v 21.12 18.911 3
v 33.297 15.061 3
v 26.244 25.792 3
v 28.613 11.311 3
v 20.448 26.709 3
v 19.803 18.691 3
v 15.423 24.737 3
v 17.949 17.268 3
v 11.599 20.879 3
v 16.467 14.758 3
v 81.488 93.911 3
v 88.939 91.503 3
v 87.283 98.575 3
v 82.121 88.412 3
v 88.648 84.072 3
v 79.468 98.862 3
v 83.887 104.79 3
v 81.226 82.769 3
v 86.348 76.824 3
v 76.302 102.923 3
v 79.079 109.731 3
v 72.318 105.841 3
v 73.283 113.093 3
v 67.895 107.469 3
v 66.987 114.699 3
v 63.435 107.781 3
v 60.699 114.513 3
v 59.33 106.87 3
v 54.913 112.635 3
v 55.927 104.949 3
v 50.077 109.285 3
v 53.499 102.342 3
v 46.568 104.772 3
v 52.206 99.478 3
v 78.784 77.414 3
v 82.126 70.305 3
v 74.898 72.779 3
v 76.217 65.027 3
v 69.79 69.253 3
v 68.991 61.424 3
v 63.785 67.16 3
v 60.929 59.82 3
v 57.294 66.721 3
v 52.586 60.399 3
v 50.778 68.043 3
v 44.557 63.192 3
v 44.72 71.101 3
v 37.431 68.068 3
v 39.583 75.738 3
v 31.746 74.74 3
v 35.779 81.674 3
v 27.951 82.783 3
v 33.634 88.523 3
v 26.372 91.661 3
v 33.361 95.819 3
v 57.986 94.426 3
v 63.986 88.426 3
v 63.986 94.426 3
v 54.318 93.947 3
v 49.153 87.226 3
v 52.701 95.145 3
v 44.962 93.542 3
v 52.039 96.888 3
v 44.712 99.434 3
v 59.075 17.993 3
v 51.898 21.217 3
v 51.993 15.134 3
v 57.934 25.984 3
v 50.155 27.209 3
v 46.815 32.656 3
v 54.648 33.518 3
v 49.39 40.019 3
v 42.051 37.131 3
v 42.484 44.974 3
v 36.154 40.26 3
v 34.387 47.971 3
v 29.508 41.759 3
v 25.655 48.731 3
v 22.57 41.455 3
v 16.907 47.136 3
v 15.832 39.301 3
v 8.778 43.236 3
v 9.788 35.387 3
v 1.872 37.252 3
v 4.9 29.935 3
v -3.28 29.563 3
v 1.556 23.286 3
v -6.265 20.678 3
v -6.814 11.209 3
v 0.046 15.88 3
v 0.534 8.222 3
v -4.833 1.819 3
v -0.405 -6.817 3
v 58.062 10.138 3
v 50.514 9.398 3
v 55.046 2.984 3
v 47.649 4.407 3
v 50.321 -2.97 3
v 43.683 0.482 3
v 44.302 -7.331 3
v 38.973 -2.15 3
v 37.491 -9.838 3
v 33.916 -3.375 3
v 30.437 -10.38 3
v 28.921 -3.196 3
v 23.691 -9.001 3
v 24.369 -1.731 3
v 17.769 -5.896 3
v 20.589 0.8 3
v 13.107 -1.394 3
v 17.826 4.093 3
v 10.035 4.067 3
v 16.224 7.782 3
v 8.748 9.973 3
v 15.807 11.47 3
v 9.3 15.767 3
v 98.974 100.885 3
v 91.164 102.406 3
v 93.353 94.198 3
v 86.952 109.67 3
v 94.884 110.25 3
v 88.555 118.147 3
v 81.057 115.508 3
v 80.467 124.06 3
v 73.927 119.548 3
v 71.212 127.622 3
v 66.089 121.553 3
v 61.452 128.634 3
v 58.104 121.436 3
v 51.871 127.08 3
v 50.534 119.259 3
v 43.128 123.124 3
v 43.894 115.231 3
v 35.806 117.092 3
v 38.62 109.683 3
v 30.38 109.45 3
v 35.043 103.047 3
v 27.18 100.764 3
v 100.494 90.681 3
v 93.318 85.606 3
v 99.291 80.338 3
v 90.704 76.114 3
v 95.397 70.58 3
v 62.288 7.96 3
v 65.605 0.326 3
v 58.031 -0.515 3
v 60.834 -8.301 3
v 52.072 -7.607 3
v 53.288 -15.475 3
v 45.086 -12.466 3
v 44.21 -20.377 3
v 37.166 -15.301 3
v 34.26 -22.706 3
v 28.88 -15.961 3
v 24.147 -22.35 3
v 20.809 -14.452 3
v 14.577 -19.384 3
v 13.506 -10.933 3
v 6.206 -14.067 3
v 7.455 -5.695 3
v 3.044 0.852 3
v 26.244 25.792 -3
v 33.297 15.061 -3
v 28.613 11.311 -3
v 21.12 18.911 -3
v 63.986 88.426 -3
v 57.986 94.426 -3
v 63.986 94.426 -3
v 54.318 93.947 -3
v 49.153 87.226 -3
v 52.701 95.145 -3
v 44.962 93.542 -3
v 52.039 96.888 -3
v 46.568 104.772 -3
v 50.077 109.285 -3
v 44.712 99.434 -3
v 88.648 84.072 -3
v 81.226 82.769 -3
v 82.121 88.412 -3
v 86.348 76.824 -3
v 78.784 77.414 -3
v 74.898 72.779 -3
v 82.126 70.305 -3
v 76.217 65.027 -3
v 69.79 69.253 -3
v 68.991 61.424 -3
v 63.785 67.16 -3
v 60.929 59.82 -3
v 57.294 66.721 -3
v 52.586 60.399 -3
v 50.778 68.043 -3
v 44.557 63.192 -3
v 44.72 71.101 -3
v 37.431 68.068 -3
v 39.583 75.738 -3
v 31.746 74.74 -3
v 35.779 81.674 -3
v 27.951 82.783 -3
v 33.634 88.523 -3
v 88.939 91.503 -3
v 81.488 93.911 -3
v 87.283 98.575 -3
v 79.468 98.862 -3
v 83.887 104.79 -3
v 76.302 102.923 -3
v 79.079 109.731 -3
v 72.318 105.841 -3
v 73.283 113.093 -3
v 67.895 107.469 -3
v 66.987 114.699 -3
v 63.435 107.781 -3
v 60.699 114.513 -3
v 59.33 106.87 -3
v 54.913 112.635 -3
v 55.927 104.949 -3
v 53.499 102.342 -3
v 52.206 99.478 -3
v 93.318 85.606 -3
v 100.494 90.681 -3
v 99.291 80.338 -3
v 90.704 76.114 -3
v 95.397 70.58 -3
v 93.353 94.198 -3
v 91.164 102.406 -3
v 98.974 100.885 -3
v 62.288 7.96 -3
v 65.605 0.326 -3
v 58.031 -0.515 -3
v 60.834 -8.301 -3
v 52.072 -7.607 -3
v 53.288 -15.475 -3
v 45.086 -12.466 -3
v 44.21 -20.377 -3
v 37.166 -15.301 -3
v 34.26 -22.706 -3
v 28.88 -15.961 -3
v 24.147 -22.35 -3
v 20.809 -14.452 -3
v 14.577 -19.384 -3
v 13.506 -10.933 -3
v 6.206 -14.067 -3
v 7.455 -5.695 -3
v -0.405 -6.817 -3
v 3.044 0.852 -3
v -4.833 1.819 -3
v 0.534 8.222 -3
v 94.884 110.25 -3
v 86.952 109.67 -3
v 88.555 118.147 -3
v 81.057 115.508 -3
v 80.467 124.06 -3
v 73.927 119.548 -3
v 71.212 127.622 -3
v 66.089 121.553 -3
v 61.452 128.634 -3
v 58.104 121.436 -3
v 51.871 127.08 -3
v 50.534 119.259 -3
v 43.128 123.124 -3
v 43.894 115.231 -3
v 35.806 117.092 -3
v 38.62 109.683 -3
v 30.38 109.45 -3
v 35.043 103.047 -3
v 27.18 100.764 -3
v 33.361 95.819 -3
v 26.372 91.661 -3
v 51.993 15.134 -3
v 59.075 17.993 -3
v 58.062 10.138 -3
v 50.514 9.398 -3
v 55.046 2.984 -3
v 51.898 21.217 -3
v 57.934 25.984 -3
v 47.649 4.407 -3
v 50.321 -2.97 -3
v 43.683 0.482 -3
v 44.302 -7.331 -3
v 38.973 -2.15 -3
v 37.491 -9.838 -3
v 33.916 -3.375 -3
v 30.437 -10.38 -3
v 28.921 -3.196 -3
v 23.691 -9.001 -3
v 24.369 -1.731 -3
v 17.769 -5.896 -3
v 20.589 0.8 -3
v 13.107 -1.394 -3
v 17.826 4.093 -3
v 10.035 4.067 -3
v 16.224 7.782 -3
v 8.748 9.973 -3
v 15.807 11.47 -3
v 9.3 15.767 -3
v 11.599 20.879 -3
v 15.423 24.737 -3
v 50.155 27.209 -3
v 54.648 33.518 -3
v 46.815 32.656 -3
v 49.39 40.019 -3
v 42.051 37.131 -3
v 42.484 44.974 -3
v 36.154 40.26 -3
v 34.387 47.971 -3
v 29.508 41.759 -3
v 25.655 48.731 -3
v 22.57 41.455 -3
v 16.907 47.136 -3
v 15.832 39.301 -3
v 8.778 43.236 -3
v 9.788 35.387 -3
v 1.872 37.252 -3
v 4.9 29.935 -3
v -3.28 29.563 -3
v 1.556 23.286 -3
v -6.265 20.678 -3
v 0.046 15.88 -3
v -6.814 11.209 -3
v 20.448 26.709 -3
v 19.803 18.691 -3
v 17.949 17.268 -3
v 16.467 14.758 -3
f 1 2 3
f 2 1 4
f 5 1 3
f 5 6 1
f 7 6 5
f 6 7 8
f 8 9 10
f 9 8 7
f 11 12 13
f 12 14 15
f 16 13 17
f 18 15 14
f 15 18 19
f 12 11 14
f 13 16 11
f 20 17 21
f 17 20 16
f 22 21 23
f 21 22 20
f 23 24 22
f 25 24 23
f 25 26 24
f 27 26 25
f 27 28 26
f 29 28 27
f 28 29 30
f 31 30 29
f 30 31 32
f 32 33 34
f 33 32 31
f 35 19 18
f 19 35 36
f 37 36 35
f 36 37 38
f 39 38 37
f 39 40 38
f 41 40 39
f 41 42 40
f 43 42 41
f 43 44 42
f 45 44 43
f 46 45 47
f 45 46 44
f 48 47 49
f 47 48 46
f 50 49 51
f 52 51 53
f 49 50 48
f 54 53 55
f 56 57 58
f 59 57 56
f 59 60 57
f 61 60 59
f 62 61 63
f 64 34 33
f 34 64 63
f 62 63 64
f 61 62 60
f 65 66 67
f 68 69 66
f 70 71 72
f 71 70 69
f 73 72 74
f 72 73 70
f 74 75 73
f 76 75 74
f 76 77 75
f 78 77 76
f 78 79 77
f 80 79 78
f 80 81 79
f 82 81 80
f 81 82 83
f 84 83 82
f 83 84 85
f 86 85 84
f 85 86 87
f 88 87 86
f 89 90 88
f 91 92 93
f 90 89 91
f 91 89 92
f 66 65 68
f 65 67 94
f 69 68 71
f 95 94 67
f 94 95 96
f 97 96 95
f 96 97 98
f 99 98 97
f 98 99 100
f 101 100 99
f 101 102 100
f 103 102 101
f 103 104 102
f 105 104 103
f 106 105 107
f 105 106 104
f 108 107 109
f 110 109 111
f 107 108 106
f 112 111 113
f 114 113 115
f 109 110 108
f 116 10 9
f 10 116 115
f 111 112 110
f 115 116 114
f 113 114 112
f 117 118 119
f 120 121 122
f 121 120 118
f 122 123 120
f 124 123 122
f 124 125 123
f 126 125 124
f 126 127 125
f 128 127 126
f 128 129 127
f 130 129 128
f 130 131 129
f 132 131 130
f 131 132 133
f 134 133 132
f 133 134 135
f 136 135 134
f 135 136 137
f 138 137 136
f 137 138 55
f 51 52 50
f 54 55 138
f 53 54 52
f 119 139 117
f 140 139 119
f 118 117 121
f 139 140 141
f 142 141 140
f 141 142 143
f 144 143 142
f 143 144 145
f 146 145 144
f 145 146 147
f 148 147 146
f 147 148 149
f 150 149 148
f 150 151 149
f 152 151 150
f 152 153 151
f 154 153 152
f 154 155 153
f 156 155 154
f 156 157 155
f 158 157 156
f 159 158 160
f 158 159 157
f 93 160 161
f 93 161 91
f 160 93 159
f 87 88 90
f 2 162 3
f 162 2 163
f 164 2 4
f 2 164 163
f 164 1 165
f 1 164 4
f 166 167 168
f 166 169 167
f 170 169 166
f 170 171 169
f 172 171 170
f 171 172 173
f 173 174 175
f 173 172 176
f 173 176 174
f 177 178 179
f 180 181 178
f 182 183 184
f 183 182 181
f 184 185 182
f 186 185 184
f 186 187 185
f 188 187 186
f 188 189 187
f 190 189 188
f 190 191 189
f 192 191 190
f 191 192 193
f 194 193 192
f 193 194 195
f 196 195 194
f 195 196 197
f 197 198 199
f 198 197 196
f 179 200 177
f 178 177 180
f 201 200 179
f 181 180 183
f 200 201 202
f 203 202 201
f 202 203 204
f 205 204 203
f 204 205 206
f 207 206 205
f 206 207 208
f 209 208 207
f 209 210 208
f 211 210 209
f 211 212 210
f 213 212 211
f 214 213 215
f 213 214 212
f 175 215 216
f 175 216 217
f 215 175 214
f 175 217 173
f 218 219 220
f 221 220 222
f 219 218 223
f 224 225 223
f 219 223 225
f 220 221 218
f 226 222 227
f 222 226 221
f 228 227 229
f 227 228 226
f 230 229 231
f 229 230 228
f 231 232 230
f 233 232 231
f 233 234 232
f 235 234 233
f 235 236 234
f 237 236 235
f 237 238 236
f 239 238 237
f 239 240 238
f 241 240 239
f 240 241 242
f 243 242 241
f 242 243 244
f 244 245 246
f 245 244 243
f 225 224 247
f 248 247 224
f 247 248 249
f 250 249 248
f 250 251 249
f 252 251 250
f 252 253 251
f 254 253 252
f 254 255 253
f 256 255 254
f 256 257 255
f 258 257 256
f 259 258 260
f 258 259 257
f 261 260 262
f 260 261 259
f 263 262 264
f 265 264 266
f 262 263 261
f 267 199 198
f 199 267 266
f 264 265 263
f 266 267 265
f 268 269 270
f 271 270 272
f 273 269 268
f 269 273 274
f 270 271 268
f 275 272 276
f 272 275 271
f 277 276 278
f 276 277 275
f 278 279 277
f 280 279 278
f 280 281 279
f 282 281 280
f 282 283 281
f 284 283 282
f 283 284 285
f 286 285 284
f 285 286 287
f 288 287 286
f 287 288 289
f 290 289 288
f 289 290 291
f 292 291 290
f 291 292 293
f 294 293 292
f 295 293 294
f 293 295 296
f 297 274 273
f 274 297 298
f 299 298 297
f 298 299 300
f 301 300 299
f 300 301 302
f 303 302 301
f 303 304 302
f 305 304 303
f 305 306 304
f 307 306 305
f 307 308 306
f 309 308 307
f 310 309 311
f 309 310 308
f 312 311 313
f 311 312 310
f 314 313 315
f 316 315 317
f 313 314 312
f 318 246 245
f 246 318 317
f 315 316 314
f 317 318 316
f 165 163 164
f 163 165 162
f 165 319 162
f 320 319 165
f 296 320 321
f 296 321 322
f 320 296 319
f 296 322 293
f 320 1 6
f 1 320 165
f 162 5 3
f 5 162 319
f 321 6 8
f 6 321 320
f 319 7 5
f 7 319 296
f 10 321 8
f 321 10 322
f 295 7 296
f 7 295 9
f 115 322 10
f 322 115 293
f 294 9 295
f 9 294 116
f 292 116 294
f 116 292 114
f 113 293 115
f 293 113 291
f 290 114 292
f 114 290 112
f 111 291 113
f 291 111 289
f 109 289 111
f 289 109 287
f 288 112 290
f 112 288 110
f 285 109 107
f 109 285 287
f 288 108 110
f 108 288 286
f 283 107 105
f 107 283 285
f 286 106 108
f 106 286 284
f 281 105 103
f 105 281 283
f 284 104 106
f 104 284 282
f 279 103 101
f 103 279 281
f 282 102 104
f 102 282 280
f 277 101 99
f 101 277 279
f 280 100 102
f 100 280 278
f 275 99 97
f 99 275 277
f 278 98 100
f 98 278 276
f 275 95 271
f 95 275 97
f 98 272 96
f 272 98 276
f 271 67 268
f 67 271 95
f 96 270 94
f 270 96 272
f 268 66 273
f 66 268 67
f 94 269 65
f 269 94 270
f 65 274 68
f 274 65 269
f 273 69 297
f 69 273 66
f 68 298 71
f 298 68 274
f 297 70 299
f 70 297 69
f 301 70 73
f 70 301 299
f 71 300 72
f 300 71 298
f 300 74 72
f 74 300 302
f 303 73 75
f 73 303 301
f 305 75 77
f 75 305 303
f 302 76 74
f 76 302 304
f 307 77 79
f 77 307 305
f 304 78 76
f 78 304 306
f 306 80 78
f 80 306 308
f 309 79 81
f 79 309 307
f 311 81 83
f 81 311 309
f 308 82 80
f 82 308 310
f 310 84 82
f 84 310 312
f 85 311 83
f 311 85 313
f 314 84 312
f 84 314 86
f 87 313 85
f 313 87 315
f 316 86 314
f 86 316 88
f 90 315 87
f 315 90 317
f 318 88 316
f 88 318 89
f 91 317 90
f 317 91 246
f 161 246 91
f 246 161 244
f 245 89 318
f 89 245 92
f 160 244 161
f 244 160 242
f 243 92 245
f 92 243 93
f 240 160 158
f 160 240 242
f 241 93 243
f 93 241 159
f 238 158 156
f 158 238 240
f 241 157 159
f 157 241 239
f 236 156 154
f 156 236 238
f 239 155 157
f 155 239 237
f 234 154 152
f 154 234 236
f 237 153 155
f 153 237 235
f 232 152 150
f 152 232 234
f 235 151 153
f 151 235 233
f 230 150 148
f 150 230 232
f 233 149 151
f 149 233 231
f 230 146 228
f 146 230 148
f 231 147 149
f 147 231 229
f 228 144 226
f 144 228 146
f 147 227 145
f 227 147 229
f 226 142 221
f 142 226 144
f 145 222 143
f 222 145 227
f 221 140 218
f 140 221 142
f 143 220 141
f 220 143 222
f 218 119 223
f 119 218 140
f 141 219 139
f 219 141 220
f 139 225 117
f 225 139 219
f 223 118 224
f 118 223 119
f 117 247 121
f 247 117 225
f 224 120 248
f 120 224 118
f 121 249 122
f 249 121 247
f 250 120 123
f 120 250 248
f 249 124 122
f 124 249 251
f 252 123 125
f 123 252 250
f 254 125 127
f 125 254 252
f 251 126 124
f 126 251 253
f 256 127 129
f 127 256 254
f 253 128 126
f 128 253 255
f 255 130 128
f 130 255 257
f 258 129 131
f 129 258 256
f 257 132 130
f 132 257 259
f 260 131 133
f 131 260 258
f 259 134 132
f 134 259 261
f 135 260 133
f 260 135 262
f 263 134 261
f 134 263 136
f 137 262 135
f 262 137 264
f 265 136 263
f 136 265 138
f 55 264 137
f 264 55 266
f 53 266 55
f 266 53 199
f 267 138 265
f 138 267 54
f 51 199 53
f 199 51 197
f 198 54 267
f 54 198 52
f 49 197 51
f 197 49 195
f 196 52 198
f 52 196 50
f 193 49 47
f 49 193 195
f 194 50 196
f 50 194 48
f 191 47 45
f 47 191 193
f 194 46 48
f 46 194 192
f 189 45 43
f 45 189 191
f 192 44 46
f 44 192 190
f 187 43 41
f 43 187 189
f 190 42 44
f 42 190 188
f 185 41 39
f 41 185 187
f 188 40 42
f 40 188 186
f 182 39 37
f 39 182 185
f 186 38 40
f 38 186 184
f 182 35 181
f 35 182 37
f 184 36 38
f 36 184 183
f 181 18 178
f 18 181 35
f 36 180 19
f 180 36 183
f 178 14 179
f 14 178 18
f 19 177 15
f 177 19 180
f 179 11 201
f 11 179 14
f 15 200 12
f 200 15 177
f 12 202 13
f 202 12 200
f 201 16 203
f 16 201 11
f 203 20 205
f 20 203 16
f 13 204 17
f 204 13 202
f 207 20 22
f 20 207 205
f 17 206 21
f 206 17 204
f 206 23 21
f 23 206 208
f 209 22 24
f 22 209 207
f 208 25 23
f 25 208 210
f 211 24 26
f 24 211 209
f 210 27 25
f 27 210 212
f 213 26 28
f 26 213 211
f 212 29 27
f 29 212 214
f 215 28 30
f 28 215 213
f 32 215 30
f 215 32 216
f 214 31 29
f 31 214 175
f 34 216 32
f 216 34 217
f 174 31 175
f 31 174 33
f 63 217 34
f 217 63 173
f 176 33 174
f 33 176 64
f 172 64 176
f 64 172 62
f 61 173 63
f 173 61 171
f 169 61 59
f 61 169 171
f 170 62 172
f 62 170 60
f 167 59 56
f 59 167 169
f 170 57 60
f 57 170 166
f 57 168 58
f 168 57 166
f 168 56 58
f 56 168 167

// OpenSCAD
 volute();


module volute()
{
path=DS_Apiral_As_Line([rnd(60),rnd(60)],[rnd(60)+40,rnd(60)+40],turns=1.5+rnd(0.5),exponent=rnd(-3,3),steps= 40,bias= (0.5) );
for(i=[0:max(0,len(path)-2)]) 
hull()
{
d1=path[i+1]-path[i];
v1=atan2(d1.y,d1.x);
d2=path[i+2]-path[i+1];
v2=atan2(d2.y,d2.x);
translate(path[i])rotate ([0,0,v1]) cube([6,6,6],center=true);
translate(path[i+1])rotate ([0,0,v2]) cube([6,6,6],center=true);
}
}



module polyline(p) {for(i=[0:max(0,len(p)-2)])line(p[i],p[i+1]);}

module polyplot(p) {for(i=[0:max(0,len(p)-1)])translate(p[i])sphere(1);}

module line(p1, p2 ,width=0.5) { hull() {        
translate(p1) sphere(width,$fn=5);
translate(p2) sphere(width,$fn=5); } }

function L_Spiral (radius = 50,turns ,exponent=1.685,start_angle=45,
steps=50,p1,p2)
=  [for(a = [1/steps:1/steps: 1  ])[ 
(radius * fx2(1-a, exponent)) * cos(start_angle+ a* abs(turns)*360*sign(turns)),
(radius * fx2(1-a, exponent)) * sin(start_angle+a* abs(turns)*360*sign(turns) )]+p1 ];

//function D_Apiral_As_Line(p1,p2,turns=3,exponent=1.685 ,steps=150,bias=0.392)=
//let(p3=lerp(p1,p2,bias) )concat(
//reverse(L_Spiral (radius=norm(p1-p3),turns =2*turns*(bias),exponent=exponent,start_angle=atan2((p3-p1).y,(p3-p1).x),steps=steps,p1=p1,p2=p3)),
//(L_Spiral (radius=norm(p2-p3),turns =2*turns*(1-bias),exponent=exponent,start_angle=atan2((p3-p2).y,(p3-p2).x),steps=steps,p1=p2,p2=p3)    ));

function DS_Apiral_As_Line(p1,p2,turns=3,exponenti=1.685 ,steps=150,bias=0.392)=
let(p3=lerp(p1,p2,bias) )concat(
reverse
(L_Spiral (radius=norm(p1-p3)*0.9,turns =- turns ,exponent=exponent,start_angle=atan2((p3-p1).y,(p3-p1).x)-70,steps=steps,p1=p1,p2=p3)),
(L_Spiral (radius=norm(p2-p3)*0.9,turns =( turns ),exponent=exponent,start_angle=atan2((p3-p2).y,(p3-p2).x)+70,steps=steps,p1=p2,p2=p3)    ));

//
//function L_Apiral_As_Line(p1,p2,turns=3,exponent=1.685 ,steps=150)=
//L_Spiral (radius=norm(p1-p2),turns =turns,exponent=exponent,start_angle=atan2((p2-p1).y,(p2-p1).x),steps=steps,p1=p1,p2=p2);

function fx2(x,n) = n<0?pow(max(0,x),1/abs(min(-1,n-1) )):pow(max(0,x),max(1,n+1))   ;
function reverse(l) = len(l)>0 ? 
[ for(i=[len(l)-1:-1:0]) l[i] ] : len(l)==0 ? [] : undef; 
function lerp(start, end, bias) = (end * bias + start * (1 - bias));
function rnd(a = 1, b = 0, s = []) = 
s == [] ? 
(rands(min(a, b), max(   a, b), 1)[0]) 
: 
(rands(min(a, b), max(a, b), 1, s)[0])
; 
